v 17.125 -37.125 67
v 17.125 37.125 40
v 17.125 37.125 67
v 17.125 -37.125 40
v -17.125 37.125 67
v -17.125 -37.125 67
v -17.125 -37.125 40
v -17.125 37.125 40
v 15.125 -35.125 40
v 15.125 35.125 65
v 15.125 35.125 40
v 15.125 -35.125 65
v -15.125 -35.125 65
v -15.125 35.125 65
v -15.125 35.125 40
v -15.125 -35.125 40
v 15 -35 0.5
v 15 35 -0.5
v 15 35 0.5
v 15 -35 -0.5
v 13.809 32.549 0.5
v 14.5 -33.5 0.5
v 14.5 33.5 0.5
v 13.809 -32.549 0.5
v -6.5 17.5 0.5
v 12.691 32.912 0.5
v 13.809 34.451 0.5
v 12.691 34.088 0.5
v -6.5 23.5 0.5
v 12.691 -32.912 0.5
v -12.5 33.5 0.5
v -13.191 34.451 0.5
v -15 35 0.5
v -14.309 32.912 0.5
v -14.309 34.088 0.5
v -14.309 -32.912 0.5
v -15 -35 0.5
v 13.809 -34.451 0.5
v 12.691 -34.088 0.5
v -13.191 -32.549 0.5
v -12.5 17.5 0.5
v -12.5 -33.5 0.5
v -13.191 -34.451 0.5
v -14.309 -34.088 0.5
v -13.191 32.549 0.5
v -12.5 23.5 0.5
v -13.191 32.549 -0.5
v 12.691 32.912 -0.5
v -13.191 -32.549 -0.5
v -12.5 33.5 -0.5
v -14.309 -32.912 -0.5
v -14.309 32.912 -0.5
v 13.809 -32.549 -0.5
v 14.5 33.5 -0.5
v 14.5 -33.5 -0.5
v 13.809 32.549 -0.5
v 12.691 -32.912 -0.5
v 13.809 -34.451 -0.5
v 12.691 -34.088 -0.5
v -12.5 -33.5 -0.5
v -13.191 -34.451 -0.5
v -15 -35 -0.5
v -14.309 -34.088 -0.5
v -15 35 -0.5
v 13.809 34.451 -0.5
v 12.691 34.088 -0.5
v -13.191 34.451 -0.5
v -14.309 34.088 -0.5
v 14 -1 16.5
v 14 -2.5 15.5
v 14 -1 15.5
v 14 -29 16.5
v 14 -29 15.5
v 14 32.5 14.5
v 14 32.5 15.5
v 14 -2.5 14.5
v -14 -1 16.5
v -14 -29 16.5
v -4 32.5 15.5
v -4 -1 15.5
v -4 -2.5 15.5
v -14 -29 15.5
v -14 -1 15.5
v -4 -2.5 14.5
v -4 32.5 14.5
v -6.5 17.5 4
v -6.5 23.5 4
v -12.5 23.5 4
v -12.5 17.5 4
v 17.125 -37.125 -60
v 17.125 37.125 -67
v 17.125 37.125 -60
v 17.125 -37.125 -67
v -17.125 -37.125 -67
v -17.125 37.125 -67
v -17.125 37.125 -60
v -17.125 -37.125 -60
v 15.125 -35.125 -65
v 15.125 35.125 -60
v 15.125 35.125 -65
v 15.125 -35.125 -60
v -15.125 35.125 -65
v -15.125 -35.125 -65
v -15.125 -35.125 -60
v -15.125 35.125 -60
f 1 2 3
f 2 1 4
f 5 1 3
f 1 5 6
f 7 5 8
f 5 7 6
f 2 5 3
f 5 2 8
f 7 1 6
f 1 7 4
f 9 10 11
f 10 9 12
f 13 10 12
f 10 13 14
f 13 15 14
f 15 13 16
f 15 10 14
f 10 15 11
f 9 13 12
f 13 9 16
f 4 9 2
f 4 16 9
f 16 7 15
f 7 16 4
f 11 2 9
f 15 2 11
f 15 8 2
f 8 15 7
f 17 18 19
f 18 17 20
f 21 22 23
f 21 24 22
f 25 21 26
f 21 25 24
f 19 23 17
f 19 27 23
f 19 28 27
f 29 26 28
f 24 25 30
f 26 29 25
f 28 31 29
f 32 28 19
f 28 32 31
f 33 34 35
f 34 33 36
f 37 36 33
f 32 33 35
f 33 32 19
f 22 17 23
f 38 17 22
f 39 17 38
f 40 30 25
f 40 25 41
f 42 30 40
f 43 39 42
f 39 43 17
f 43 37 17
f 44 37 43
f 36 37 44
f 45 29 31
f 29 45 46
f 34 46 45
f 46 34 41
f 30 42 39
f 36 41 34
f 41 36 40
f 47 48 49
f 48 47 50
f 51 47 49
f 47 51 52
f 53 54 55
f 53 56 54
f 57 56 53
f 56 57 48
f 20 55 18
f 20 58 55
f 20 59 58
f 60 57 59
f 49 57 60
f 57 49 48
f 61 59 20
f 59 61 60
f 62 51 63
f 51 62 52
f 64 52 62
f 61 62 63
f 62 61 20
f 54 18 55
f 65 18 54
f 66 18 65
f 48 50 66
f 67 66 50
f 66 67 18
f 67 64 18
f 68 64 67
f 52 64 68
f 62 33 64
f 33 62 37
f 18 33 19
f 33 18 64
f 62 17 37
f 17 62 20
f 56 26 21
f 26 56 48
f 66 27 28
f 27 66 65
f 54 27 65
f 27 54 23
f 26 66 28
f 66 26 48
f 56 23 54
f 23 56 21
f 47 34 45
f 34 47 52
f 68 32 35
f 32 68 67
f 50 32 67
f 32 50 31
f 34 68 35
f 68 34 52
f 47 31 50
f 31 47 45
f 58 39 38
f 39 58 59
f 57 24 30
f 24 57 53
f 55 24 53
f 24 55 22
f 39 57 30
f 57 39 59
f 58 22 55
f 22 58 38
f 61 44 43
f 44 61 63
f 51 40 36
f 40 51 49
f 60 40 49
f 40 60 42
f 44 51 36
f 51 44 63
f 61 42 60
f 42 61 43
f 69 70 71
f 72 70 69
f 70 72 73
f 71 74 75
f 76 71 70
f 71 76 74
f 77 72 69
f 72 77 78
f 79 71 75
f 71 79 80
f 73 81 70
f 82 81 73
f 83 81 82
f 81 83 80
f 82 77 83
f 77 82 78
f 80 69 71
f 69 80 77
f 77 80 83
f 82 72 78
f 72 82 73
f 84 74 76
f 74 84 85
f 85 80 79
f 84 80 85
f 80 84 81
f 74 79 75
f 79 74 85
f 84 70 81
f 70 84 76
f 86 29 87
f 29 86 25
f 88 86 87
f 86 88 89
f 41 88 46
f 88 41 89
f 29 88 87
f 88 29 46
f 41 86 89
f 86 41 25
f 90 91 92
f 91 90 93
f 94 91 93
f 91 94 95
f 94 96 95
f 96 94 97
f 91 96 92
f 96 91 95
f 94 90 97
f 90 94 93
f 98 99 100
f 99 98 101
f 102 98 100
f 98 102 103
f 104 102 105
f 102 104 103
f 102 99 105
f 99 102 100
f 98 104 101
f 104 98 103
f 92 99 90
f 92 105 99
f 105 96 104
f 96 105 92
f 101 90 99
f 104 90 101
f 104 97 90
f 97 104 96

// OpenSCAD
/**
 * - screen cut
 * - usb cut
 * - button cut
 * - button
 * - screw plates
 * - wall thighteners
 */


breadboard_width = 30;
breadboard_length = 70;
breadboard_spacing = 0.25;
inner_height = 30;
wall_thickness = 2;

wall_thickness_x2 = wall_thickness * 2;

x_cut_offset = 10;

module thickShell() {
  difference() {
    cube([breadboard_width + wall_thickness_x2 + breadboard_spacing, breadboard_length + wall_thickness_x2 + breadboard_spacing, inner_height + wall_thickness_x2], center=true);

    cube([breadboard_width + breadboard_spacing, breadboard_length + breadboard_spacing, inner_height], center=true);
  }
}

module deviceModel() {

  screwXOffset = breadboard_width / 2 - 1.5;
  screwYOffset = breadboard_length / 2 - 1.5;

  translate([0, -15, 16])
    cube([28, 28, 1], center=true);

  translate([5, 15, 15])
    cube([18, 35, 1], center=true);

  translate([-breadboard_width / 2 + 6 / 2 + 2.5, breadboard_length / 2 - 6 / 2 - 11.5, 2])
    cube([6, 6, 4], center=true);

  difference() {
    cube([breadboard_width, breadboard_length, 1], center=true);

    translate([screwXOffset, screwYOffset, 0]) {
      cylinder(h=10, r=1, center=true);
    }

    translate([-screwXOffset, screwYOffset, 0]) {
      cylinder(h=10, r=1, center=true);
    }

    translate([screwXOffset, -screwYOffset, 0]) {
      cylinder(h=10, r=1, center=true);
    }

    translate([-screwXOffset, -screwYOffset, 0]) {
      cylinder(h=10, r=1, center=true);
    }
  }
}

module bottomShell() {
  // bottom shell
  difference() {
    thickShell();
    translate([0, 0, inner_height-x_cut_offset])
      cube([breadboard_width * 2, breadboard_length * 2, inner_height * 2], center=true);
  }
}

// upper shell
module upperShell() {
  difference() {
    thickShell();
    translate([0, 0, -inner_height-x_cut_offset])
      cube([breadboard_width * 2, breadboard_length * 2, inner_height * 2], center=true);
  }
}

translate([0, 0, 50])
  upperShell();

deviceModel();

translate([0, 0, -50])
  bottomShell();
